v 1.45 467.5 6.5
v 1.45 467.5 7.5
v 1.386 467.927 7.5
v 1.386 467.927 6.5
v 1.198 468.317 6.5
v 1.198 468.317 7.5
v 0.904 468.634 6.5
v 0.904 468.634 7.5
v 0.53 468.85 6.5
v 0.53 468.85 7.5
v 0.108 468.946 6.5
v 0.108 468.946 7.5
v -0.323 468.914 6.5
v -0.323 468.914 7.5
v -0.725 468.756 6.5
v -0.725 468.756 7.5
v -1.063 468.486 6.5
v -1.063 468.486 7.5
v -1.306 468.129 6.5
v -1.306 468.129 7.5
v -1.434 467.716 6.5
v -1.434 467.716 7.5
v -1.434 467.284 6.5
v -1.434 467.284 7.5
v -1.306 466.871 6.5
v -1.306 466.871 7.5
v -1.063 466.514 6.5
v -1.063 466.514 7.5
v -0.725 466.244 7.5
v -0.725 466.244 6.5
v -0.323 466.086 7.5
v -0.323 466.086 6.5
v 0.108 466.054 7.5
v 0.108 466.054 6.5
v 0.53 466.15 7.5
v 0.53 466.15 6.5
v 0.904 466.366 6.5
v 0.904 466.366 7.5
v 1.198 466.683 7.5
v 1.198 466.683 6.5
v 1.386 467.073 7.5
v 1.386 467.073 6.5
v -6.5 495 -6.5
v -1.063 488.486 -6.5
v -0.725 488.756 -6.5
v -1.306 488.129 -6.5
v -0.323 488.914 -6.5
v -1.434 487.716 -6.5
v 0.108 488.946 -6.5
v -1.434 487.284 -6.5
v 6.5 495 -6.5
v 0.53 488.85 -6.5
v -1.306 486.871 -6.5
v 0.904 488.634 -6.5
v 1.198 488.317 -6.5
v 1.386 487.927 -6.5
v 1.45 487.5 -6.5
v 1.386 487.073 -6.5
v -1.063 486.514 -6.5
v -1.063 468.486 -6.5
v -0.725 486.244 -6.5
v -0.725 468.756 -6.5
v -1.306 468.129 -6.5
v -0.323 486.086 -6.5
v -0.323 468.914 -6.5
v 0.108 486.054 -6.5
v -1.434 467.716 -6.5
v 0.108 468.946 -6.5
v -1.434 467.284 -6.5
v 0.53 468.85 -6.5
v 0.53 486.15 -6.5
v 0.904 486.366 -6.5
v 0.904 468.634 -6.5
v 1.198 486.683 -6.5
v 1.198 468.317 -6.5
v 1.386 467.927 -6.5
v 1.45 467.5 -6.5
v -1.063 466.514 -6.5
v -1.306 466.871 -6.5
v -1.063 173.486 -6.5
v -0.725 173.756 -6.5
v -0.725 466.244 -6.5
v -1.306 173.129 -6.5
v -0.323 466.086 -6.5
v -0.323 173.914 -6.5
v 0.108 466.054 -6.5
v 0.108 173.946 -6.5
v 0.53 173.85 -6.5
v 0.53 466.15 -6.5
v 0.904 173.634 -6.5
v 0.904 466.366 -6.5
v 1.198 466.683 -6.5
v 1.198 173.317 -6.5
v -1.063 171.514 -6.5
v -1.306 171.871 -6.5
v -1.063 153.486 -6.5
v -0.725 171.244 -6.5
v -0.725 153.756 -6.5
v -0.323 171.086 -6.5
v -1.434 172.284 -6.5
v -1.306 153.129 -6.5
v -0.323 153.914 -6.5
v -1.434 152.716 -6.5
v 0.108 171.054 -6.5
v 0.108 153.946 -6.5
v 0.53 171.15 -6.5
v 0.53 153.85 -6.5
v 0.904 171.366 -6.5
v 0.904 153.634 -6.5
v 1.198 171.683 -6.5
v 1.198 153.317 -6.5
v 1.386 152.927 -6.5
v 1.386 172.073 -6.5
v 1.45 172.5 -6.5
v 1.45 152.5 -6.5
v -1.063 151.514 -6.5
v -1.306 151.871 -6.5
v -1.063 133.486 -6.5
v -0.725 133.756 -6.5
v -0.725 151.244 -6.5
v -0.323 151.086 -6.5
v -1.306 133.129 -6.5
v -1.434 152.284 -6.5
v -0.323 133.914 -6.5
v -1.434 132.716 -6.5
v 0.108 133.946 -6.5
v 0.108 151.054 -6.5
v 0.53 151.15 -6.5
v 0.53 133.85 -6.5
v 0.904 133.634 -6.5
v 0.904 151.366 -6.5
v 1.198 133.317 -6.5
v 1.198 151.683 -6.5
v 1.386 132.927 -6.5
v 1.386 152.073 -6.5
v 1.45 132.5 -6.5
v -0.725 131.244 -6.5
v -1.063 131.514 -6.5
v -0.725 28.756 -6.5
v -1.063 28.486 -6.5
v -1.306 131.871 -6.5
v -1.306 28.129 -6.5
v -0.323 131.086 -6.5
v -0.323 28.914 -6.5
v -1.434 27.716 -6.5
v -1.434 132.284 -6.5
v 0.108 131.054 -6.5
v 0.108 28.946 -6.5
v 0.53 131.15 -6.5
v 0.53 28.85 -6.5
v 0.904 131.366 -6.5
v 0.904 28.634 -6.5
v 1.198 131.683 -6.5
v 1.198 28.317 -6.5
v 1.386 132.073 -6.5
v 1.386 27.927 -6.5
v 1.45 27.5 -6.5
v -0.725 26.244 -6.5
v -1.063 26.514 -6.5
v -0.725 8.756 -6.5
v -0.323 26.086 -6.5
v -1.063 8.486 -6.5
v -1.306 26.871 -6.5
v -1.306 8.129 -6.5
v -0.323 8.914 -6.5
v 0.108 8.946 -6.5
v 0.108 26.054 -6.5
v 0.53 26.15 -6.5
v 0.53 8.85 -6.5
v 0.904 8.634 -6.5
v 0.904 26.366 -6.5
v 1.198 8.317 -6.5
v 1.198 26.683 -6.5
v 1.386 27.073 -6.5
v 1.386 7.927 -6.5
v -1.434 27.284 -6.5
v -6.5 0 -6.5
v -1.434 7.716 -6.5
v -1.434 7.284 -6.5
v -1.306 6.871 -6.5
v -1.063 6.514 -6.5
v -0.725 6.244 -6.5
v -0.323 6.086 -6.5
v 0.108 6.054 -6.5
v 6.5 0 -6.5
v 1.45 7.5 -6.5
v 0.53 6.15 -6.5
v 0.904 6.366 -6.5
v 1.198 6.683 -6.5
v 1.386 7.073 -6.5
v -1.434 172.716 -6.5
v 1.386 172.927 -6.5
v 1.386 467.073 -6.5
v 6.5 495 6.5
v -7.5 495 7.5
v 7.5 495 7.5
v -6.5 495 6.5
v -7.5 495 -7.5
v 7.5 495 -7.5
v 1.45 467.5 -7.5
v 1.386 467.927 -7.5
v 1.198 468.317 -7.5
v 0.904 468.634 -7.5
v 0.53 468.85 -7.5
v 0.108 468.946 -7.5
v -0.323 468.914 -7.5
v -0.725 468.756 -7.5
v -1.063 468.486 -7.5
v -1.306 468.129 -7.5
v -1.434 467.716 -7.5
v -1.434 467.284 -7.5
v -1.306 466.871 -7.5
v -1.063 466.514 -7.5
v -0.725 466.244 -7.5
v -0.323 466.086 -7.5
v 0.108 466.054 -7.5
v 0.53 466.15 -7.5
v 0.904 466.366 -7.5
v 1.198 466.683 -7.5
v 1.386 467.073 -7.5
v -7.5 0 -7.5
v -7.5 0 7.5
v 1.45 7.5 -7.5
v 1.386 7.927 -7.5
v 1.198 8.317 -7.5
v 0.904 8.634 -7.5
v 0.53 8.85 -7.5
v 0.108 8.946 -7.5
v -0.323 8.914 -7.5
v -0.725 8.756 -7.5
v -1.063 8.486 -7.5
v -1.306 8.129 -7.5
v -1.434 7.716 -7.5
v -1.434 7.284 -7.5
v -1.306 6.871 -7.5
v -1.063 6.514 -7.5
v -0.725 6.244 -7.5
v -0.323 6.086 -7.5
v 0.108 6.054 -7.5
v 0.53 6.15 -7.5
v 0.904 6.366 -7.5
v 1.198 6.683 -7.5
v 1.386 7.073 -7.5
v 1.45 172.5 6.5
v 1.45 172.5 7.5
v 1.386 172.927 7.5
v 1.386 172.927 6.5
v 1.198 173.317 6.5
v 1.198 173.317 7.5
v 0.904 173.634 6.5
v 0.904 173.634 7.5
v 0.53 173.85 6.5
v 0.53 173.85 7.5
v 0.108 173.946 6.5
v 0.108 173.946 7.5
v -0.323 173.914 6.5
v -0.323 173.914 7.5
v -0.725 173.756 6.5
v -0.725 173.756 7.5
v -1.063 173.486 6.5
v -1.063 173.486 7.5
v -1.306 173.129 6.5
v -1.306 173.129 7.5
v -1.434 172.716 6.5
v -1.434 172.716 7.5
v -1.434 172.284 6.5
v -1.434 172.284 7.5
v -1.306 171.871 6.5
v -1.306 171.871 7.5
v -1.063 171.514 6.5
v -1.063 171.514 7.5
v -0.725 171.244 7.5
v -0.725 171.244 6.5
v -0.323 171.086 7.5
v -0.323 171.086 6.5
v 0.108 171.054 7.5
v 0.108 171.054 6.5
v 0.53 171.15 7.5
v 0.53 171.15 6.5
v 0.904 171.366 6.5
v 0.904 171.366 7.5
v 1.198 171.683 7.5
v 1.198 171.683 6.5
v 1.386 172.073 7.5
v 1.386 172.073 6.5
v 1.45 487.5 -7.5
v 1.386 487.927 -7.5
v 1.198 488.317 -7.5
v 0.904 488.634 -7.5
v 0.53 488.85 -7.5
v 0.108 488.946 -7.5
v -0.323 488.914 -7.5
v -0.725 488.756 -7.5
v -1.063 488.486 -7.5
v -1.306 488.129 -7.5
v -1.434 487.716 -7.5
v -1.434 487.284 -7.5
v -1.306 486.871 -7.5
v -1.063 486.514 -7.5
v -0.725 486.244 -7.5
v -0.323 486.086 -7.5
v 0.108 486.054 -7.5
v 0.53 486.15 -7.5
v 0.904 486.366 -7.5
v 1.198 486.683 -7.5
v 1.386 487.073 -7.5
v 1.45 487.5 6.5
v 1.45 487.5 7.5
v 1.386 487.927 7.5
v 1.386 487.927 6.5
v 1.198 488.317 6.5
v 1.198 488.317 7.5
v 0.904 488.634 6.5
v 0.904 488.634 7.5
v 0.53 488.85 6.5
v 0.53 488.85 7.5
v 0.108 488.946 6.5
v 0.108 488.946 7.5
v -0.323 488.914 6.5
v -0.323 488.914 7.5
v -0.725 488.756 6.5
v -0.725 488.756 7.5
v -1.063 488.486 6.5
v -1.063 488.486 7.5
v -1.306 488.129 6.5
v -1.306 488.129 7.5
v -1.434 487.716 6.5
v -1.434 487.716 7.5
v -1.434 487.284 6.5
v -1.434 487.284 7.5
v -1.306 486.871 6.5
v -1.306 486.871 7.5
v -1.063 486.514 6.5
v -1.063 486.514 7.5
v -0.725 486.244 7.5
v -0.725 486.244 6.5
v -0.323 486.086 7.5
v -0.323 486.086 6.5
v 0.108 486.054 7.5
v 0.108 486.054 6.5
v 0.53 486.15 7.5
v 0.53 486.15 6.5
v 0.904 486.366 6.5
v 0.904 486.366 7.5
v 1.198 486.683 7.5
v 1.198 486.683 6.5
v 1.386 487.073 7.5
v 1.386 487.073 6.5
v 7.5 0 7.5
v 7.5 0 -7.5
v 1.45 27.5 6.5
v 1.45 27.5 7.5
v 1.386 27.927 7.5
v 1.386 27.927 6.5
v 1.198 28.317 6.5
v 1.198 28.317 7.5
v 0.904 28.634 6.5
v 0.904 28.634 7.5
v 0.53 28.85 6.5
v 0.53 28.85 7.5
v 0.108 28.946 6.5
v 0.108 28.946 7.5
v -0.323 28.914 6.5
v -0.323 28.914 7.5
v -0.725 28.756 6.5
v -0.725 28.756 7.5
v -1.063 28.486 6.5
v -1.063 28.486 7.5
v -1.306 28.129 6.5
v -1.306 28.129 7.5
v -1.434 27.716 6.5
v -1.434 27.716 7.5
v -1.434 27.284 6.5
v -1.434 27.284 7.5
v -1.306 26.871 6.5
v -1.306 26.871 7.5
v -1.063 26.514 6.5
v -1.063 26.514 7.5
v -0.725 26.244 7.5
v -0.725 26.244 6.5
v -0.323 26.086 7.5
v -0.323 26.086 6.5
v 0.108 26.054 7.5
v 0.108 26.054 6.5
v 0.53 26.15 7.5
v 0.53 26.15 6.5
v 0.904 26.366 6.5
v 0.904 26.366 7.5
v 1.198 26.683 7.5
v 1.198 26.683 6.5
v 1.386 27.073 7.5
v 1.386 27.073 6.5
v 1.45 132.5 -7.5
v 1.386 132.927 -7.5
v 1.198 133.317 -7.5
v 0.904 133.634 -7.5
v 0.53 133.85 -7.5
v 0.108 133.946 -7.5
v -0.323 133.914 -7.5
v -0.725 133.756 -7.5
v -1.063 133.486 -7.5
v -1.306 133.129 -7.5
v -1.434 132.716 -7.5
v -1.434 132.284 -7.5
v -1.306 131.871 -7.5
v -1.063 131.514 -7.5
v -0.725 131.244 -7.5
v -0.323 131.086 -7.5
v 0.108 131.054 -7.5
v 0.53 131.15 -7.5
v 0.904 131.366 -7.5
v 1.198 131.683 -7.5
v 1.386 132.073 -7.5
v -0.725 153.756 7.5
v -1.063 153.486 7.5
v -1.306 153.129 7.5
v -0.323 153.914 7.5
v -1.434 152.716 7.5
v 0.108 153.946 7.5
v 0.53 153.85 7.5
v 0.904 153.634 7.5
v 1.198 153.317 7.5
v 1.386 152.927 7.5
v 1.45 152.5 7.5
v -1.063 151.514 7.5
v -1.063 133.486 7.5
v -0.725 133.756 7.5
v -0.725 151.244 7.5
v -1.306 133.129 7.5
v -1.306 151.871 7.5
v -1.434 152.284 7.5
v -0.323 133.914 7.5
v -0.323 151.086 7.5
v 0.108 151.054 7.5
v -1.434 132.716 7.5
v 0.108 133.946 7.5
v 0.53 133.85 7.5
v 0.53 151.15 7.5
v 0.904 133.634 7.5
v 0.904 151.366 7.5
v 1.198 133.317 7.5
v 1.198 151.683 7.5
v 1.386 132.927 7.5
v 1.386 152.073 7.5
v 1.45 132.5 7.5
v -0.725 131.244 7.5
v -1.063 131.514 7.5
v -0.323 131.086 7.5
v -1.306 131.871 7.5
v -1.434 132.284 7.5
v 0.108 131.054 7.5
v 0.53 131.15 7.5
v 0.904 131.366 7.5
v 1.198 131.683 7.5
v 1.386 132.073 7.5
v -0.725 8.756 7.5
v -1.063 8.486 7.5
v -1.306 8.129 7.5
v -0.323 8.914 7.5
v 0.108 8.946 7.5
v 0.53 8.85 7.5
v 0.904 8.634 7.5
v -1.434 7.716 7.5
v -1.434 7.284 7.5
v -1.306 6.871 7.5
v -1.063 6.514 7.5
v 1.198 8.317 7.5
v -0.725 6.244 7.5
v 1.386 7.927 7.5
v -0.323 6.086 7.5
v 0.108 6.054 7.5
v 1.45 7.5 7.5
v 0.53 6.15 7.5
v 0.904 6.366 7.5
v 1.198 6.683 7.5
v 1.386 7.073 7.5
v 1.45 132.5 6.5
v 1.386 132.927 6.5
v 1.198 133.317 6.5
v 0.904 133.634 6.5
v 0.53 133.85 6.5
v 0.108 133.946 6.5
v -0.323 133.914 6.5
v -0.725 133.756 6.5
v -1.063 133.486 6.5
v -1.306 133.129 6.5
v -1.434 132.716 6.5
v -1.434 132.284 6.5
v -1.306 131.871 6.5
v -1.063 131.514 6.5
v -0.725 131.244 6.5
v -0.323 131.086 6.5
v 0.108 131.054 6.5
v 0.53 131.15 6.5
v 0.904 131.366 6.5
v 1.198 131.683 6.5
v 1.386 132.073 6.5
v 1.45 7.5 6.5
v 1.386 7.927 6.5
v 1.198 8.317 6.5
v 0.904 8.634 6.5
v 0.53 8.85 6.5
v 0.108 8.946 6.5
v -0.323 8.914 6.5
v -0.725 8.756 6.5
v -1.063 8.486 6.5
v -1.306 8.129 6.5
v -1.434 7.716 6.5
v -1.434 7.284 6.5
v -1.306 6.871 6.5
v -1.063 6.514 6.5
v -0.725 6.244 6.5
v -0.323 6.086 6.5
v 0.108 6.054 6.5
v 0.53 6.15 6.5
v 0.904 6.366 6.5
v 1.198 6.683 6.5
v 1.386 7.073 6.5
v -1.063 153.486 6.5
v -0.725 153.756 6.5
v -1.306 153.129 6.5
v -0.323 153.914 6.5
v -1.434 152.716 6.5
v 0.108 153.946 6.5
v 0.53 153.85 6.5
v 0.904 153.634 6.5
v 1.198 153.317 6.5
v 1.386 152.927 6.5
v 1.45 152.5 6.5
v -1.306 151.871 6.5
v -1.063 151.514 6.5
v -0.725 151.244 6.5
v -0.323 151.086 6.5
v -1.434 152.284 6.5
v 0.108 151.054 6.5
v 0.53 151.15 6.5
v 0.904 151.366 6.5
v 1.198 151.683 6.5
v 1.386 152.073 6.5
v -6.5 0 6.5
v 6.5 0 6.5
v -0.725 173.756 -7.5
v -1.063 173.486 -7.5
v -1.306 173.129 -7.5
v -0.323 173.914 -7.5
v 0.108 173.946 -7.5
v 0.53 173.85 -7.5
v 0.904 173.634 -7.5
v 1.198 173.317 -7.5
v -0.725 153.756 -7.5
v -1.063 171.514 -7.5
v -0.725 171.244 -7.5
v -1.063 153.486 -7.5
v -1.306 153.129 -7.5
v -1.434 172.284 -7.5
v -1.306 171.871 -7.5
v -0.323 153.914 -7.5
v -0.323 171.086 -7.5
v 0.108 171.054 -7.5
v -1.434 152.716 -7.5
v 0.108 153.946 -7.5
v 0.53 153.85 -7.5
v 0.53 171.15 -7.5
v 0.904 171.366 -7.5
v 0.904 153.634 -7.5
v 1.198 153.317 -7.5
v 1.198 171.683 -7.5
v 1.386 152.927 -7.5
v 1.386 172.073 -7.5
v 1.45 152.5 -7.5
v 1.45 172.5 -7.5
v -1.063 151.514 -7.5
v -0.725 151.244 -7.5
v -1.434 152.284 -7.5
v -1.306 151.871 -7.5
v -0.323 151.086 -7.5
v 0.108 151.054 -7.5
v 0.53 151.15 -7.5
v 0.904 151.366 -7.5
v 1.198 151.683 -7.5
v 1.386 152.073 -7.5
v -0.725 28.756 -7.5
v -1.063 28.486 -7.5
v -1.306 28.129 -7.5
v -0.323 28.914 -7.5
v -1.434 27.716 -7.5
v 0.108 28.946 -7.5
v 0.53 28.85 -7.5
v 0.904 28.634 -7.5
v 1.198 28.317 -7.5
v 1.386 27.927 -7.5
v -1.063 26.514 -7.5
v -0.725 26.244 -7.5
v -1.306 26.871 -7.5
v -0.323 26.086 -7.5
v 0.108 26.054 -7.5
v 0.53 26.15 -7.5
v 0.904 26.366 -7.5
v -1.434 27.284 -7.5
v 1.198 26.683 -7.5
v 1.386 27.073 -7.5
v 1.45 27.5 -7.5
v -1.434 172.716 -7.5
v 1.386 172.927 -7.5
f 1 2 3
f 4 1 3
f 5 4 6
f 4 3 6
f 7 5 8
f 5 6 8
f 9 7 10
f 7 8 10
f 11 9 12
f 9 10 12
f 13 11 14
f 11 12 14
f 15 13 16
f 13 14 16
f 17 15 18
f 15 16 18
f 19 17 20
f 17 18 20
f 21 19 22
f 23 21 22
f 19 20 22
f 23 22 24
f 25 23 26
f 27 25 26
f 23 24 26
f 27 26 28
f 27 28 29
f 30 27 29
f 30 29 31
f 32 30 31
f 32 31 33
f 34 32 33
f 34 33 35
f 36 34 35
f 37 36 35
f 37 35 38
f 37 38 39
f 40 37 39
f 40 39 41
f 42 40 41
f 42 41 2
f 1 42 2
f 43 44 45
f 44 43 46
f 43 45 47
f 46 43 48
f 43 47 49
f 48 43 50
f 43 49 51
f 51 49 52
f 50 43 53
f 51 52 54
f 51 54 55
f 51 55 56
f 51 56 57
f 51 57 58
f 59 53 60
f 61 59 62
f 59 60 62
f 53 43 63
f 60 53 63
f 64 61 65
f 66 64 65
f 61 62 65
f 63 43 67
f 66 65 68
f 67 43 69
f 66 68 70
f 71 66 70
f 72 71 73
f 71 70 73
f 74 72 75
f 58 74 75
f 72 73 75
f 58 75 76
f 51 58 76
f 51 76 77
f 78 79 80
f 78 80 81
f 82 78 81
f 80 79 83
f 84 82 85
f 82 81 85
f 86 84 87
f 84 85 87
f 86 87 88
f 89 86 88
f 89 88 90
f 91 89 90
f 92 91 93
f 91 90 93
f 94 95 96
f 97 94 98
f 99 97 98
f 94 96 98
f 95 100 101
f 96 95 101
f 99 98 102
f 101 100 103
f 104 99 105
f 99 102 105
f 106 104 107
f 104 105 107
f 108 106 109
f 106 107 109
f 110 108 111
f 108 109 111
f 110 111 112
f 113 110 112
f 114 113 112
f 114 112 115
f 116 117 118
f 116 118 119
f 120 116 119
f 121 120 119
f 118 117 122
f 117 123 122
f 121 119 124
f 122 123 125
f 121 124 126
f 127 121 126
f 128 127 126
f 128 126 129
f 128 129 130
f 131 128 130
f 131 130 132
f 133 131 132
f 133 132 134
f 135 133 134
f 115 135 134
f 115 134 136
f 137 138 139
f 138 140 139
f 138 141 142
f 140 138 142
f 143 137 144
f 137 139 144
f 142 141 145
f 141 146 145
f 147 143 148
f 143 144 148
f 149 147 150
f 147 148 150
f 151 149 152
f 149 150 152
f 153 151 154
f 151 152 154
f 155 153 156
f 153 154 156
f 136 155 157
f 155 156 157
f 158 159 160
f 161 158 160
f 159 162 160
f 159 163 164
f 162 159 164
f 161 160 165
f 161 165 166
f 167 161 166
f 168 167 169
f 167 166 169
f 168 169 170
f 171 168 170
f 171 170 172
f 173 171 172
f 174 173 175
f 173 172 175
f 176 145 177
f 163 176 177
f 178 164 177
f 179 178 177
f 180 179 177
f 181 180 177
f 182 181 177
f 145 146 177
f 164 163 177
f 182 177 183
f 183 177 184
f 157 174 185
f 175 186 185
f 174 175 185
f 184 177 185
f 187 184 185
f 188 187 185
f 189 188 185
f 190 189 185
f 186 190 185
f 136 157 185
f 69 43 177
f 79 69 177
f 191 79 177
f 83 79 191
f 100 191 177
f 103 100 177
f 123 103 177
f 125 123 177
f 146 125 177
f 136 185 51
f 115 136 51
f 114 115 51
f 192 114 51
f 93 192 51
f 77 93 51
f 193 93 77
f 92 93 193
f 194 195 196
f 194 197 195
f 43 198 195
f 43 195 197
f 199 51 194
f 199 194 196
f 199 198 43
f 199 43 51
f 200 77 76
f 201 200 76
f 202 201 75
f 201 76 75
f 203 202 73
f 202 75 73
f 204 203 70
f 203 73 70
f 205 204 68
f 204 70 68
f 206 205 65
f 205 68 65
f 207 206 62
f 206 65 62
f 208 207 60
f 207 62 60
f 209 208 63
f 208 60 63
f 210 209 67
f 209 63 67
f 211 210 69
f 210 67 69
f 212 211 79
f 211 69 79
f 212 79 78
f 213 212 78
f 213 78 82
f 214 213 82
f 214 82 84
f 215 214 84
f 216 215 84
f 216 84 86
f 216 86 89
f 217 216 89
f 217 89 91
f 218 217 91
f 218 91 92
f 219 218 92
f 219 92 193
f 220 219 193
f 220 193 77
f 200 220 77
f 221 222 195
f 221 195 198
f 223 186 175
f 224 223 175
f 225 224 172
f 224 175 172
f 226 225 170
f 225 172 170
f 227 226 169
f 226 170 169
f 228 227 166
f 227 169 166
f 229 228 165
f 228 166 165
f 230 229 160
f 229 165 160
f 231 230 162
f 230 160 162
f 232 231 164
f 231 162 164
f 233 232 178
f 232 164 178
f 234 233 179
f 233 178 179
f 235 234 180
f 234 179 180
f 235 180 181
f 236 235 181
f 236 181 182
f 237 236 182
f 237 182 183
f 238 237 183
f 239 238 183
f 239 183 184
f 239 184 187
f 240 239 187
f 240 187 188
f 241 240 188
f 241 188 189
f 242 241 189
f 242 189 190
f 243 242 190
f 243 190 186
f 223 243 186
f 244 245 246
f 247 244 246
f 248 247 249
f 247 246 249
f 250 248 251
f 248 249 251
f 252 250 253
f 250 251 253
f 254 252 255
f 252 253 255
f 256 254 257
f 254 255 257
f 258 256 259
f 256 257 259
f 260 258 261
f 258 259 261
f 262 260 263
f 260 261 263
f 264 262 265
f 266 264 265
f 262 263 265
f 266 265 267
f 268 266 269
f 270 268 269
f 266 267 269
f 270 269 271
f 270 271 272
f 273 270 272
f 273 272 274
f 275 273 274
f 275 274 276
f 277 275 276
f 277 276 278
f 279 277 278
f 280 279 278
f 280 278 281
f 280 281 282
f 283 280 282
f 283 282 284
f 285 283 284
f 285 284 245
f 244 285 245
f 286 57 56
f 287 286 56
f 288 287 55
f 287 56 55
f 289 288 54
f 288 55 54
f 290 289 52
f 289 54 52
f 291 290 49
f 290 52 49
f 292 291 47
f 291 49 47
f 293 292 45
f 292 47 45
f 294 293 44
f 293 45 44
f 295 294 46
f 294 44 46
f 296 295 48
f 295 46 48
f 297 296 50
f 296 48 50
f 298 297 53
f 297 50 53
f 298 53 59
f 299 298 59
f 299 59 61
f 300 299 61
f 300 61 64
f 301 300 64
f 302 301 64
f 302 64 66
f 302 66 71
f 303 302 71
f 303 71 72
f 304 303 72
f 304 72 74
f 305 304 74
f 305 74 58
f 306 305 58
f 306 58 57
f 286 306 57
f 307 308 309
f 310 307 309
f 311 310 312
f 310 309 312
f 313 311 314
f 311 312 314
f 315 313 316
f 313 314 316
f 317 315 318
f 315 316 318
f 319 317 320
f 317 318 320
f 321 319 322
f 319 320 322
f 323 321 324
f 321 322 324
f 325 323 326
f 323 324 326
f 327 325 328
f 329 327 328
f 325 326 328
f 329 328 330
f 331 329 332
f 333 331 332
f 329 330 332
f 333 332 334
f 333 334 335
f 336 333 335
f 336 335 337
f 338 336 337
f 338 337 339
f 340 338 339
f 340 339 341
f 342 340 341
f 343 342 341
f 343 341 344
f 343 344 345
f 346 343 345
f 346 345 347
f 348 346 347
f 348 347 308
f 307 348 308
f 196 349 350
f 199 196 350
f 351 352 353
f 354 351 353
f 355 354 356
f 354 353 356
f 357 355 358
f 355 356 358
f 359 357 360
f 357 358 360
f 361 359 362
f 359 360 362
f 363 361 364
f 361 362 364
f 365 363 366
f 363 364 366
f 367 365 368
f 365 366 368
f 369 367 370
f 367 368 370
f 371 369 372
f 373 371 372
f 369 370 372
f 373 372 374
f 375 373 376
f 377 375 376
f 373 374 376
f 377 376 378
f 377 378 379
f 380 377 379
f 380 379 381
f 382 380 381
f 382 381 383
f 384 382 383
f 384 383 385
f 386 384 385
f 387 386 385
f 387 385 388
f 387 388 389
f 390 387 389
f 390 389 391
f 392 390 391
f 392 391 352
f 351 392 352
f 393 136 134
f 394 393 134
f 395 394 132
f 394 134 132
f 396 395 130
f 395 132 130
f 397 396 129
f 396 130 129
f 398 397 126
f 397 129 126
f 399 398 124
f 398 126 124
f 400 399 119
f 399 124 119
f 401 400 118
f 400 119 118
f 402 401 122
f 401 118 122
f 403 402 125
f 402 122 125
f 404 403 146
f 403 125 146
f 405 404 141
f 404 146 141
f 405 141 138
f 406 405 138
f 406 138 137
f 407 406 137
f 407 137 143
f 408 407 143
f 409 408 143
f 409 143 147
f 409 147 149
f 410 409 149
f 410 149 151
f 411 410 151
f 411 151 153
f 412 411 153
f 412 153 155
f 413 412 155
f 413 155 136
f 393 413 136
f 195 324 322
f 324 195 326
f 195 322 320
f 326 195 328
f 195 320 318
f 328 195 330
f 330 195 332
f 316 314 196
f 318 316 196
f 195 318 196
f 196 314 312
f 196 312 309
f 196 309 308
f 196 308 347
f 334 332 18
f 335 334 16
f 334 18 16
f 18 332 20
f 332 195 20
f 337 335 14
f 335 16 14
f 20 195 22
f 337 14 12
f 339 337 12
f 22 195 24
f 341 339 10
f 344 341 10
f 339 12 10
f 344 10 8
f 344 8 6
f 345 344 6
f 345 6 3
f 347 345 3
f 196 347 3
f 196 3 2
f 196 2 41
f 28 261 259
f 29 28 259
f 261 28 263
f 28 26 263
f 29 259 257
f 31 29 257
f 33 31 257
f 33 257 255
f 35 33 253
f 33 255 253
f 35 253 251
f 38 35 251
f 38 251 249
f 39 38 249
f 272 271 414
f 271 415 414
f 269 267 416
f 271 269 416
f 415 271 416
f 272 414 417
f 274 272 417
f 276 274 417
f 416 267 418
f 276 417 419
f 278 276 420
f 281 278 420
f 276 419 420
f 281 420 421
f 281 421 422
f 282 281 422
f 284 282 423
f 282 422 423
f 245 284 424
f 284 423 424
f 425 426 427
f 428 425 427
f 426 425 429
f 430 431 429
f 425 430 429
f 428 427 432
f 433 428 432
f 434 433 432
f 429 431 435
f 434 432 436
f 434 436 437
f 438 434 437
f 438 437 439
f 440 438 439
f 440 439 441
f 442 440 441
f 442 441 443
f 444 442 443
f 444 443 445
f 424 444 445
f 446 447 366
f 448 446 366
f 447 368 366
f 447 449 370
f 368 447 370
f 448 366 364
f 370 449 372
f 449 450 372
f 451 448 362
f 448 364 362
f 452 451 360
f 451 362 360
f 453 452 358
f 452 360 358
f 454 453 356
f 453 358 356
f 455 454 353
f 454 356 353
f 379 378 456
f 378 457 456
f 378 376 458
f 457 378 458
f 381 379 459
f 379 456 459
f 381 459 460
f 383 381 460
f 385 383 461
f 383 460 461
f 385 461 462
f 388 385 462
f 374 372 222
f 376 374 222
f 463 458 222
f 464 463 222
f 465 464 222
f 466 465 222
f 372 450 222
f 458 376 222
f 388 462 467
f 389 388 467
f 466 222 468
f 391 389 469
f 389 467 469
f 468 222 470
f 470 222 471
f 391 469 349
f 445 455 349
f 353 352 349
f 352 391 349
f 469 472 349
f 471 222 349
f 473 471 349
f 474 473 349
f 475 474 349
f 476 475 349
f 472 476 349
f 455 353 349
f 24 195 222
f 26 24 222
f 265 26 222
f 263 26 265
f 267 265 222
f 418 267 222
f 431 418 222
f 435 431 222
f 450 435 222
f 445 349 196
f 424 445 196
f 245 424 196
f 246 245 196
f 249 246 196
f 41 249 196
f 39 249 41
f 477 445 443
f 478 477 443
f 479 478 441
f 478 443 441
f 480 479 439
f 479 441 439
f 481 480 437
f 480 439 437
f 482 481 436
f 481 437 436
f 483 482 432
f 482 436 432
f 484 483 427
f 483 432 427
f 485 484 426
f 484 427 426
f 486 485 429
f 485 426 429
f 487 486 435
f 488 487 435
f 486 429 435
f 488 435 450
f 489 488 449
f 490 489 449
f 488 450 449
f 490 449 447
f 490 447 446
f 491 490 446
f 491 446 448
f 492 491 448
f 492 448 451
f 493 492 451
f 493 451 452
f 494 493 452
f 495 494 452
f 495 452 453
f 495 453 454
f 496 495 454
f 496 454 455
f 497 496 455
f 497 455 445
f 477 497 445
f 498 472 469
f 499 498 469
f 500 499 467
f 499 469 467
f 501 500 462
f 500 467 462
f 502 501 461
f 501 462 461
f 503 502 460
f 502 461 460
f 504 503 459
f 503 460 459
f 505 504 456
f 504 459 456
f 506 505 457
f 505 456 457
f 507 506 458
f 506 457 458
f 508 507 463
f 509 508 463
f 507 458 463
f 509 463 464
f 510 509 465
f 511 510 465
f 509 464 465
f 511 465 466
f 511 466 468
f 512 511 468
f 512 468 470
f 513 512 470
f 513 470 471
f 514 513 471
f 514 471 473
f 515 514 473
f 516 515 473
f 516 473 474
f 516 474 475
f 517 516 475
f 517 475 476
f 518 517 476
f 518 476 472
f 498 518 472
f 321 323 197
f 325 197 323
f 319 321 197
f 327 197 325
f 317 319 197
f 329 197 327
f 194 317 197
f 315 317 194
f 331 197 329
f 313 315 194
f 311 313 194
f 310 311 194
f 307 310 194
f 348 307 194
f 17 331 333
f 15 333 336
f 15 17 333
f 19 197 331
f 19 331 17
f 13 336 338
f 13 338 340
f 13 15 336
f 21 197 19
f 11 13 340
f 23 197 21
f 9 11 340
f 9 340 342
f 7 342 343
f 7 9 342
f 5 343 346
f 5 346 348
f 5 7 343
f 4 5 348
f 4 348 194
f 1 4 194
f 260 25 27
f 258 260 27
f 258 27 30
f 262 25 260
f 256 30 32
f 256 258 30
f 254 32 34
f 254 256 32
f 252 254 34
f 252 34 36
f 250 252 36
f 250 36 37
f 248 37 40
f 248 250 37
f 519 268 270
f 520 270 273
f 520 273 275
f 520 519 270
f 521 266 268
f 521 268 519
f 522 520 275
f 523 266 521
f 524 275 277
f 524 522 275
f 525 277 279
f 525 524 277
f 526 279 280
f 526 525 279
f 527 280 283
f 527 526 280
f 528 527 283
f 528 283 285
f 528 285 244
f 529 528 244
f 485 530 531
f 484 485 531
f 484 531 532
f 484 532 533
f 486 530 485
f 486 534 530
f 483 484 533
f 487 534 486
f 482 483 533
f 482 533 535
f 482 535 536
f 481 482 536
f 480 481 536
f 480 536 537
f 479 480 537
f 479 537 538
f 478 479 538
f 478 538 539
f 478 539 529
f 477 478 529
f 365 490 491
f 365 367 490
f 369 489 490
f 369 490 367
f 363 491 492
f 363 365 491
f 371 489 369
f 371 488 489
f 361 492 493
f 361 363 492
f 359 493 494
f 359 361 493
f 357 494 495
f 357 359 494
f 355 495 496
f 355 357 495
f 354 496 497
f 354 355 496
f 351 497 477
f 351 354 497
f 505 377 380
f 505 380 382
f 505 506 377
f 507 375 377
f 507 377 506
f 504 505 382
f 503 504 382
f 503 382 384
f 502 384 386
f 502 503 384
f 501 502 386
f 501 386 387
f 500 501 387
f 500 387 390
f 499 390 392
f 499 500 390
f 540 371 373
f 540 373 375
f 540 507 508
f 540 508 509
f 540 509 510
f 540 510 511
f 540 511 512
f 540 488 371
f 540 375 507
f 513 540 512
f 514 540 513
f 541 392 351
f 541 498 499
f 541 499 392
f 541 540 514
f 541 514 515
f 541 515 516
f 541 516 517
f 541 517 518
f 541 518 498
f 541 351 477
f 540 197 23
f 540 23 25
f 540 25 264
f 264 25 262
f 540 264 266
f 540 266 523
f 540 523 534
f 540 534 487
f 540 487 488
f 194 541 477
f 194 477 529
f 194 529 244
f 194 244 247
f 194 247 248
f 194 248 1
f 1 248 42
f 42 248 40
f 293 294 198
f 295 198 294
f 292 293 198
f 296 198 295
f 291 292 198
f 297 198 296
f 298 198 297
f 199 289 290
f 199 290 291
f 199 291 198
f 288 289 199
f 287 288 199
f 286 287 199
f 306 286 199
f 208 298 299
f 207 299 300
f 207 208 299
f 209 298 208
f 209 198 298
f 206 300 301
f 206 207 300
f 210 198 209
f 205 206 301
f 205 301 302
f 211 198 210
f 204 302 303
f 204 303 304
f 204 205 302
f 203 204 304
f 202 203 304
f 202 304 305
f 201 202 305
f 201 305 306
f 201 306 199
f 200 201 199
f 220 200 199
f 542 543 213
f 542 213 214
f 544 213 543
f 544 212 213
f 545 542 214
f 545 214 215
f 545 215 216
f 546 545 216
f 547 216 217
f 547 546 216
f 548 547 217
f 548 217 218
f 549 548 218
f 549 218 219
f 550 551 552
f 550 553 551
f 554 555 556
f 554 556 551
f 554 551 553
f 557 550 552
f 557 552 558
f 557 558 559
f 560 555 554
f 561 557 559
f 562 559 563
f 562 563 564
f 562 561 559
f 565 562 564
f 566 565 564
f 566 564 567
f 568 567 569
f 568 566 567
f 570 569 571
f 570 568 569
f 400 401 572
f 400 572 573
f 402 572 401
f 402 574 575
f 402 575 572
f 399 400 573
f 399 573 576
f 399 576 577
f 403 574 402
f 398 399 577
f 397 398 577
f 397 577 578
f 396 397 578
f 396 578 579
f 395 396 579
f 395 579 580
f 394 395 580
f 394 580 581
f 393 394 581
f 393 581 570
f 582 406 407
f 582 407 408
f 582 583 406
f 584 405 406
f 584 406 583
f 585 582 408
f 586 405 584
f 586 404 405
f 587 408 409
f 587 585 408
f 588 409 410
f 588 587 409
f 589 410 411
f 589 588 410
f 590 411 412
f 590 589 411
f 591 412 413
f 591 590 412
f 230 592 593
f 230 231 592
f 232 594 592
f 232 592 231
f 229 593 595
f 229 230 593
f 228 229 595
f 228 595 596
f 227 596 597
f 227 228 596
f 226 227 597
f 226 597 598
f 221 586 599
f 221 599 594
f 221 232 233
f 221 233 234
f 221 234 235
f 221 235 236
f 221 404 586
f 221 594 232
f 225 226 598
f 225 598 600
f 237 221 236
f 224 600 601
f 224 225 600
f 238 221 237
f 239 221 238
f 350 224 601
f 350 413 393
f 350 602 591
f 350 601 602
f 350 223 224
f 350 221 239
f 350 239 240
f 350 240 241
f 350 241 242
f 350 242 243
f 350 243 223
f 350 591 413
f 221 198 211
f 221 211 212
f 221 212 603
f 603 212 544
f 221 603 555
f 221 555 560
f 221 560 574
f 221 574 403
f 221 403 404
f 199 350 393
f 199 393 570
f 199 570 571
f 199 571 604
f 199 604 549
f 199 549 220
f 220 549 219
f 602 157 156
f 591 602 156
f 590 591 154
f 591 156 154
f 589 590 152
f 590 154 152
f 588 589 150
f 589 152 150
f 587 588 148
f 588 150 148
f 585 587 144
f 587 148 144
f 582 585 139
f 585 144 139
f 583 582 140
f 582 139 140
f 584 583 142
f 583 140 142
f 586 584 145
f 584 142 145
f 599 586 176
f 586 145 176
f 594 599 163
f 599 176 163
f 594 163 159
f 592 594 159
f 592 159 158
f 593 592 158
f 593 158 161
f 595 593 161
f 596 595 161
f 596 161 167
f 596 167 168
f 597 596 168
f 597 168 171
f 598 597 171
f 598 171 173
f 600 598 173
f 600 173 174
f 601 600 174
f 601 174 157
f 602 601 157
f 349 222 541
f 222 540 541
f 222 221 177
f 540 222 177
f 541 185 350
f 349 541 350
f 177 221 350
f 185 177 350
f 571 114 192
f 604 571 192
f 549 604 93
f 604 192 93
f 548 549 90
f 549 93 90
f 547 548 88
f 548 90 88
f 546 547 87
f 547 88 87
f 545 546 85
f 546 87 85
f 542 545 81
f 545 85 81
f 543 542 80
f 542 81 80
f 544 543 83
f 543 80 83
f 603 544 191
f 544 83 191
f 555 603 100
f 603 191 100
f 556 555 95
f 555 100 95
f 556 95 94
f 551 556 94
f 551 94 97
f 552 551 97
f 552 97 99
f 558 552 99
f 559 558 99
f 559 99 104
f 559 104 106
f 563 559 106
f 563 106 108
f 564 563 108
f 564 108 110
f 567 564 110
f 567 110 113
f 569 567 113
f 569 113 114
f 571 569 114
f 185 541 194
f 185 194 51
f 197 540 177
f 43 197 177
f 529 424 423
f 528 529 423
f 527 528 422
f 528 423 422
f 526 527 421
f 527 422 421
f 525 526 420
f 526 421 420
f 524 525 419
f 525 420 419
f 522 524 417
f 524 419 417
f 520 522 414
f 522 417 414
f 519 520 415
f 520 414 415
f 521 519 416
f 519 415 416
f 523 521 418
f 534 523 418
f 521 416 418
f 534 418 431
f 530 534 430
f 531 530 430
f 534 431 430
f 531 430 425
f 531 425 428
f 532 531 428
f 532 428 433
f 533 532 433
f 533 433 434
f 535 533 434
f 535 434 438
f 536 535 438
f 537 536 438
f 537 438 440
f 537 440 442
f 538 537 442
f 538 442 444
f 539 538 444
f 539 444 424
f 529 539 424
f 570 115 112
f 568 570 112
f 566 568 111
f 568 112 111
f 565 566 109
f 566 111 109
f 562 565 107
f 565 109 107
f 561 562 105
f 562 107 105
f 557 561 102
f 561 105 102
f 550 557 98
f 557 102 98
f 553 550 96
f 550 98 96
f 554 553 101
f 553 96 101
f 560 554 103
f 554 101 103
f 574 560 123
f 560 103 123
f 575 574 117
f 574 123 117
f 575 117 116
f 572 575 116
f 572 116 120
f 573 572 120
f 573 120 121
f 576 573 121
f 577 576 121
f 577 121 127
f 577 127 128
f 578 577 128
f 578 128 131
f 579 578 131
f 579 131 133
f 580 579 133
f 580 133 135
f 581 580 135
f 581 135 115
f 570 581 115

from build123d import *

# Parameters (mm, degrees)
SKETCH_1_W          = 15
SKETCH_1_H          = 15
SKETCH_1_W_2        = 13
SKETCH_1_H_2        = 13
EXTRUDE_1_DEPTH     = 495
SKETCH_2_R          = 1.45
CUT_EXTRUDE_1_DEPTH = 496.284009433


with BuildPart() as part:
    # 草图1 → 拉伸-薄壁1 (new body)
    with BuildSketch(Plane(origin=(0, 0, 0), x_dir=(1, 0, 0), z_dir=(0, 1, 0))):
        Rectangle(SKETCH_1_W, SKETCH_1_H)
        Rectangle(SKETCH_1_W_2, SKETCH_1_H_2, mode=Mode.SUBTRACT)
    extrude(amount=EXTRUDE_1_DEPTH)

    # 草图2 → 切除-拉伸1 (cut, through all)
    with BuildSketch(Plane.XY.offset(7.5)):
        with Locations((0, 487.5)):
            Circle(SKETCH_2_R)
        with Locations((0, 467.5)):
            Circle(SKETCH_2_R)
        with Locations((0, 27.5)):
            Circle(SKETCH_2_R)
        with Locations((0, 7.5)):
            Circle(SKETCH_2_R)
        with Locations((0, 152.5)):
            Circle(SKETCH_2_R)
        with Locations((0, 172.5)):
            Circle(SKETCH_2_R)
        with Locations((0, 132.5)):
            Circle(SKETCH_2_R)
    extrude(amount=-CUT_EXTRUDE_1_DEPTH, mode=Mode.SUBTRACT)


solid = part.part
